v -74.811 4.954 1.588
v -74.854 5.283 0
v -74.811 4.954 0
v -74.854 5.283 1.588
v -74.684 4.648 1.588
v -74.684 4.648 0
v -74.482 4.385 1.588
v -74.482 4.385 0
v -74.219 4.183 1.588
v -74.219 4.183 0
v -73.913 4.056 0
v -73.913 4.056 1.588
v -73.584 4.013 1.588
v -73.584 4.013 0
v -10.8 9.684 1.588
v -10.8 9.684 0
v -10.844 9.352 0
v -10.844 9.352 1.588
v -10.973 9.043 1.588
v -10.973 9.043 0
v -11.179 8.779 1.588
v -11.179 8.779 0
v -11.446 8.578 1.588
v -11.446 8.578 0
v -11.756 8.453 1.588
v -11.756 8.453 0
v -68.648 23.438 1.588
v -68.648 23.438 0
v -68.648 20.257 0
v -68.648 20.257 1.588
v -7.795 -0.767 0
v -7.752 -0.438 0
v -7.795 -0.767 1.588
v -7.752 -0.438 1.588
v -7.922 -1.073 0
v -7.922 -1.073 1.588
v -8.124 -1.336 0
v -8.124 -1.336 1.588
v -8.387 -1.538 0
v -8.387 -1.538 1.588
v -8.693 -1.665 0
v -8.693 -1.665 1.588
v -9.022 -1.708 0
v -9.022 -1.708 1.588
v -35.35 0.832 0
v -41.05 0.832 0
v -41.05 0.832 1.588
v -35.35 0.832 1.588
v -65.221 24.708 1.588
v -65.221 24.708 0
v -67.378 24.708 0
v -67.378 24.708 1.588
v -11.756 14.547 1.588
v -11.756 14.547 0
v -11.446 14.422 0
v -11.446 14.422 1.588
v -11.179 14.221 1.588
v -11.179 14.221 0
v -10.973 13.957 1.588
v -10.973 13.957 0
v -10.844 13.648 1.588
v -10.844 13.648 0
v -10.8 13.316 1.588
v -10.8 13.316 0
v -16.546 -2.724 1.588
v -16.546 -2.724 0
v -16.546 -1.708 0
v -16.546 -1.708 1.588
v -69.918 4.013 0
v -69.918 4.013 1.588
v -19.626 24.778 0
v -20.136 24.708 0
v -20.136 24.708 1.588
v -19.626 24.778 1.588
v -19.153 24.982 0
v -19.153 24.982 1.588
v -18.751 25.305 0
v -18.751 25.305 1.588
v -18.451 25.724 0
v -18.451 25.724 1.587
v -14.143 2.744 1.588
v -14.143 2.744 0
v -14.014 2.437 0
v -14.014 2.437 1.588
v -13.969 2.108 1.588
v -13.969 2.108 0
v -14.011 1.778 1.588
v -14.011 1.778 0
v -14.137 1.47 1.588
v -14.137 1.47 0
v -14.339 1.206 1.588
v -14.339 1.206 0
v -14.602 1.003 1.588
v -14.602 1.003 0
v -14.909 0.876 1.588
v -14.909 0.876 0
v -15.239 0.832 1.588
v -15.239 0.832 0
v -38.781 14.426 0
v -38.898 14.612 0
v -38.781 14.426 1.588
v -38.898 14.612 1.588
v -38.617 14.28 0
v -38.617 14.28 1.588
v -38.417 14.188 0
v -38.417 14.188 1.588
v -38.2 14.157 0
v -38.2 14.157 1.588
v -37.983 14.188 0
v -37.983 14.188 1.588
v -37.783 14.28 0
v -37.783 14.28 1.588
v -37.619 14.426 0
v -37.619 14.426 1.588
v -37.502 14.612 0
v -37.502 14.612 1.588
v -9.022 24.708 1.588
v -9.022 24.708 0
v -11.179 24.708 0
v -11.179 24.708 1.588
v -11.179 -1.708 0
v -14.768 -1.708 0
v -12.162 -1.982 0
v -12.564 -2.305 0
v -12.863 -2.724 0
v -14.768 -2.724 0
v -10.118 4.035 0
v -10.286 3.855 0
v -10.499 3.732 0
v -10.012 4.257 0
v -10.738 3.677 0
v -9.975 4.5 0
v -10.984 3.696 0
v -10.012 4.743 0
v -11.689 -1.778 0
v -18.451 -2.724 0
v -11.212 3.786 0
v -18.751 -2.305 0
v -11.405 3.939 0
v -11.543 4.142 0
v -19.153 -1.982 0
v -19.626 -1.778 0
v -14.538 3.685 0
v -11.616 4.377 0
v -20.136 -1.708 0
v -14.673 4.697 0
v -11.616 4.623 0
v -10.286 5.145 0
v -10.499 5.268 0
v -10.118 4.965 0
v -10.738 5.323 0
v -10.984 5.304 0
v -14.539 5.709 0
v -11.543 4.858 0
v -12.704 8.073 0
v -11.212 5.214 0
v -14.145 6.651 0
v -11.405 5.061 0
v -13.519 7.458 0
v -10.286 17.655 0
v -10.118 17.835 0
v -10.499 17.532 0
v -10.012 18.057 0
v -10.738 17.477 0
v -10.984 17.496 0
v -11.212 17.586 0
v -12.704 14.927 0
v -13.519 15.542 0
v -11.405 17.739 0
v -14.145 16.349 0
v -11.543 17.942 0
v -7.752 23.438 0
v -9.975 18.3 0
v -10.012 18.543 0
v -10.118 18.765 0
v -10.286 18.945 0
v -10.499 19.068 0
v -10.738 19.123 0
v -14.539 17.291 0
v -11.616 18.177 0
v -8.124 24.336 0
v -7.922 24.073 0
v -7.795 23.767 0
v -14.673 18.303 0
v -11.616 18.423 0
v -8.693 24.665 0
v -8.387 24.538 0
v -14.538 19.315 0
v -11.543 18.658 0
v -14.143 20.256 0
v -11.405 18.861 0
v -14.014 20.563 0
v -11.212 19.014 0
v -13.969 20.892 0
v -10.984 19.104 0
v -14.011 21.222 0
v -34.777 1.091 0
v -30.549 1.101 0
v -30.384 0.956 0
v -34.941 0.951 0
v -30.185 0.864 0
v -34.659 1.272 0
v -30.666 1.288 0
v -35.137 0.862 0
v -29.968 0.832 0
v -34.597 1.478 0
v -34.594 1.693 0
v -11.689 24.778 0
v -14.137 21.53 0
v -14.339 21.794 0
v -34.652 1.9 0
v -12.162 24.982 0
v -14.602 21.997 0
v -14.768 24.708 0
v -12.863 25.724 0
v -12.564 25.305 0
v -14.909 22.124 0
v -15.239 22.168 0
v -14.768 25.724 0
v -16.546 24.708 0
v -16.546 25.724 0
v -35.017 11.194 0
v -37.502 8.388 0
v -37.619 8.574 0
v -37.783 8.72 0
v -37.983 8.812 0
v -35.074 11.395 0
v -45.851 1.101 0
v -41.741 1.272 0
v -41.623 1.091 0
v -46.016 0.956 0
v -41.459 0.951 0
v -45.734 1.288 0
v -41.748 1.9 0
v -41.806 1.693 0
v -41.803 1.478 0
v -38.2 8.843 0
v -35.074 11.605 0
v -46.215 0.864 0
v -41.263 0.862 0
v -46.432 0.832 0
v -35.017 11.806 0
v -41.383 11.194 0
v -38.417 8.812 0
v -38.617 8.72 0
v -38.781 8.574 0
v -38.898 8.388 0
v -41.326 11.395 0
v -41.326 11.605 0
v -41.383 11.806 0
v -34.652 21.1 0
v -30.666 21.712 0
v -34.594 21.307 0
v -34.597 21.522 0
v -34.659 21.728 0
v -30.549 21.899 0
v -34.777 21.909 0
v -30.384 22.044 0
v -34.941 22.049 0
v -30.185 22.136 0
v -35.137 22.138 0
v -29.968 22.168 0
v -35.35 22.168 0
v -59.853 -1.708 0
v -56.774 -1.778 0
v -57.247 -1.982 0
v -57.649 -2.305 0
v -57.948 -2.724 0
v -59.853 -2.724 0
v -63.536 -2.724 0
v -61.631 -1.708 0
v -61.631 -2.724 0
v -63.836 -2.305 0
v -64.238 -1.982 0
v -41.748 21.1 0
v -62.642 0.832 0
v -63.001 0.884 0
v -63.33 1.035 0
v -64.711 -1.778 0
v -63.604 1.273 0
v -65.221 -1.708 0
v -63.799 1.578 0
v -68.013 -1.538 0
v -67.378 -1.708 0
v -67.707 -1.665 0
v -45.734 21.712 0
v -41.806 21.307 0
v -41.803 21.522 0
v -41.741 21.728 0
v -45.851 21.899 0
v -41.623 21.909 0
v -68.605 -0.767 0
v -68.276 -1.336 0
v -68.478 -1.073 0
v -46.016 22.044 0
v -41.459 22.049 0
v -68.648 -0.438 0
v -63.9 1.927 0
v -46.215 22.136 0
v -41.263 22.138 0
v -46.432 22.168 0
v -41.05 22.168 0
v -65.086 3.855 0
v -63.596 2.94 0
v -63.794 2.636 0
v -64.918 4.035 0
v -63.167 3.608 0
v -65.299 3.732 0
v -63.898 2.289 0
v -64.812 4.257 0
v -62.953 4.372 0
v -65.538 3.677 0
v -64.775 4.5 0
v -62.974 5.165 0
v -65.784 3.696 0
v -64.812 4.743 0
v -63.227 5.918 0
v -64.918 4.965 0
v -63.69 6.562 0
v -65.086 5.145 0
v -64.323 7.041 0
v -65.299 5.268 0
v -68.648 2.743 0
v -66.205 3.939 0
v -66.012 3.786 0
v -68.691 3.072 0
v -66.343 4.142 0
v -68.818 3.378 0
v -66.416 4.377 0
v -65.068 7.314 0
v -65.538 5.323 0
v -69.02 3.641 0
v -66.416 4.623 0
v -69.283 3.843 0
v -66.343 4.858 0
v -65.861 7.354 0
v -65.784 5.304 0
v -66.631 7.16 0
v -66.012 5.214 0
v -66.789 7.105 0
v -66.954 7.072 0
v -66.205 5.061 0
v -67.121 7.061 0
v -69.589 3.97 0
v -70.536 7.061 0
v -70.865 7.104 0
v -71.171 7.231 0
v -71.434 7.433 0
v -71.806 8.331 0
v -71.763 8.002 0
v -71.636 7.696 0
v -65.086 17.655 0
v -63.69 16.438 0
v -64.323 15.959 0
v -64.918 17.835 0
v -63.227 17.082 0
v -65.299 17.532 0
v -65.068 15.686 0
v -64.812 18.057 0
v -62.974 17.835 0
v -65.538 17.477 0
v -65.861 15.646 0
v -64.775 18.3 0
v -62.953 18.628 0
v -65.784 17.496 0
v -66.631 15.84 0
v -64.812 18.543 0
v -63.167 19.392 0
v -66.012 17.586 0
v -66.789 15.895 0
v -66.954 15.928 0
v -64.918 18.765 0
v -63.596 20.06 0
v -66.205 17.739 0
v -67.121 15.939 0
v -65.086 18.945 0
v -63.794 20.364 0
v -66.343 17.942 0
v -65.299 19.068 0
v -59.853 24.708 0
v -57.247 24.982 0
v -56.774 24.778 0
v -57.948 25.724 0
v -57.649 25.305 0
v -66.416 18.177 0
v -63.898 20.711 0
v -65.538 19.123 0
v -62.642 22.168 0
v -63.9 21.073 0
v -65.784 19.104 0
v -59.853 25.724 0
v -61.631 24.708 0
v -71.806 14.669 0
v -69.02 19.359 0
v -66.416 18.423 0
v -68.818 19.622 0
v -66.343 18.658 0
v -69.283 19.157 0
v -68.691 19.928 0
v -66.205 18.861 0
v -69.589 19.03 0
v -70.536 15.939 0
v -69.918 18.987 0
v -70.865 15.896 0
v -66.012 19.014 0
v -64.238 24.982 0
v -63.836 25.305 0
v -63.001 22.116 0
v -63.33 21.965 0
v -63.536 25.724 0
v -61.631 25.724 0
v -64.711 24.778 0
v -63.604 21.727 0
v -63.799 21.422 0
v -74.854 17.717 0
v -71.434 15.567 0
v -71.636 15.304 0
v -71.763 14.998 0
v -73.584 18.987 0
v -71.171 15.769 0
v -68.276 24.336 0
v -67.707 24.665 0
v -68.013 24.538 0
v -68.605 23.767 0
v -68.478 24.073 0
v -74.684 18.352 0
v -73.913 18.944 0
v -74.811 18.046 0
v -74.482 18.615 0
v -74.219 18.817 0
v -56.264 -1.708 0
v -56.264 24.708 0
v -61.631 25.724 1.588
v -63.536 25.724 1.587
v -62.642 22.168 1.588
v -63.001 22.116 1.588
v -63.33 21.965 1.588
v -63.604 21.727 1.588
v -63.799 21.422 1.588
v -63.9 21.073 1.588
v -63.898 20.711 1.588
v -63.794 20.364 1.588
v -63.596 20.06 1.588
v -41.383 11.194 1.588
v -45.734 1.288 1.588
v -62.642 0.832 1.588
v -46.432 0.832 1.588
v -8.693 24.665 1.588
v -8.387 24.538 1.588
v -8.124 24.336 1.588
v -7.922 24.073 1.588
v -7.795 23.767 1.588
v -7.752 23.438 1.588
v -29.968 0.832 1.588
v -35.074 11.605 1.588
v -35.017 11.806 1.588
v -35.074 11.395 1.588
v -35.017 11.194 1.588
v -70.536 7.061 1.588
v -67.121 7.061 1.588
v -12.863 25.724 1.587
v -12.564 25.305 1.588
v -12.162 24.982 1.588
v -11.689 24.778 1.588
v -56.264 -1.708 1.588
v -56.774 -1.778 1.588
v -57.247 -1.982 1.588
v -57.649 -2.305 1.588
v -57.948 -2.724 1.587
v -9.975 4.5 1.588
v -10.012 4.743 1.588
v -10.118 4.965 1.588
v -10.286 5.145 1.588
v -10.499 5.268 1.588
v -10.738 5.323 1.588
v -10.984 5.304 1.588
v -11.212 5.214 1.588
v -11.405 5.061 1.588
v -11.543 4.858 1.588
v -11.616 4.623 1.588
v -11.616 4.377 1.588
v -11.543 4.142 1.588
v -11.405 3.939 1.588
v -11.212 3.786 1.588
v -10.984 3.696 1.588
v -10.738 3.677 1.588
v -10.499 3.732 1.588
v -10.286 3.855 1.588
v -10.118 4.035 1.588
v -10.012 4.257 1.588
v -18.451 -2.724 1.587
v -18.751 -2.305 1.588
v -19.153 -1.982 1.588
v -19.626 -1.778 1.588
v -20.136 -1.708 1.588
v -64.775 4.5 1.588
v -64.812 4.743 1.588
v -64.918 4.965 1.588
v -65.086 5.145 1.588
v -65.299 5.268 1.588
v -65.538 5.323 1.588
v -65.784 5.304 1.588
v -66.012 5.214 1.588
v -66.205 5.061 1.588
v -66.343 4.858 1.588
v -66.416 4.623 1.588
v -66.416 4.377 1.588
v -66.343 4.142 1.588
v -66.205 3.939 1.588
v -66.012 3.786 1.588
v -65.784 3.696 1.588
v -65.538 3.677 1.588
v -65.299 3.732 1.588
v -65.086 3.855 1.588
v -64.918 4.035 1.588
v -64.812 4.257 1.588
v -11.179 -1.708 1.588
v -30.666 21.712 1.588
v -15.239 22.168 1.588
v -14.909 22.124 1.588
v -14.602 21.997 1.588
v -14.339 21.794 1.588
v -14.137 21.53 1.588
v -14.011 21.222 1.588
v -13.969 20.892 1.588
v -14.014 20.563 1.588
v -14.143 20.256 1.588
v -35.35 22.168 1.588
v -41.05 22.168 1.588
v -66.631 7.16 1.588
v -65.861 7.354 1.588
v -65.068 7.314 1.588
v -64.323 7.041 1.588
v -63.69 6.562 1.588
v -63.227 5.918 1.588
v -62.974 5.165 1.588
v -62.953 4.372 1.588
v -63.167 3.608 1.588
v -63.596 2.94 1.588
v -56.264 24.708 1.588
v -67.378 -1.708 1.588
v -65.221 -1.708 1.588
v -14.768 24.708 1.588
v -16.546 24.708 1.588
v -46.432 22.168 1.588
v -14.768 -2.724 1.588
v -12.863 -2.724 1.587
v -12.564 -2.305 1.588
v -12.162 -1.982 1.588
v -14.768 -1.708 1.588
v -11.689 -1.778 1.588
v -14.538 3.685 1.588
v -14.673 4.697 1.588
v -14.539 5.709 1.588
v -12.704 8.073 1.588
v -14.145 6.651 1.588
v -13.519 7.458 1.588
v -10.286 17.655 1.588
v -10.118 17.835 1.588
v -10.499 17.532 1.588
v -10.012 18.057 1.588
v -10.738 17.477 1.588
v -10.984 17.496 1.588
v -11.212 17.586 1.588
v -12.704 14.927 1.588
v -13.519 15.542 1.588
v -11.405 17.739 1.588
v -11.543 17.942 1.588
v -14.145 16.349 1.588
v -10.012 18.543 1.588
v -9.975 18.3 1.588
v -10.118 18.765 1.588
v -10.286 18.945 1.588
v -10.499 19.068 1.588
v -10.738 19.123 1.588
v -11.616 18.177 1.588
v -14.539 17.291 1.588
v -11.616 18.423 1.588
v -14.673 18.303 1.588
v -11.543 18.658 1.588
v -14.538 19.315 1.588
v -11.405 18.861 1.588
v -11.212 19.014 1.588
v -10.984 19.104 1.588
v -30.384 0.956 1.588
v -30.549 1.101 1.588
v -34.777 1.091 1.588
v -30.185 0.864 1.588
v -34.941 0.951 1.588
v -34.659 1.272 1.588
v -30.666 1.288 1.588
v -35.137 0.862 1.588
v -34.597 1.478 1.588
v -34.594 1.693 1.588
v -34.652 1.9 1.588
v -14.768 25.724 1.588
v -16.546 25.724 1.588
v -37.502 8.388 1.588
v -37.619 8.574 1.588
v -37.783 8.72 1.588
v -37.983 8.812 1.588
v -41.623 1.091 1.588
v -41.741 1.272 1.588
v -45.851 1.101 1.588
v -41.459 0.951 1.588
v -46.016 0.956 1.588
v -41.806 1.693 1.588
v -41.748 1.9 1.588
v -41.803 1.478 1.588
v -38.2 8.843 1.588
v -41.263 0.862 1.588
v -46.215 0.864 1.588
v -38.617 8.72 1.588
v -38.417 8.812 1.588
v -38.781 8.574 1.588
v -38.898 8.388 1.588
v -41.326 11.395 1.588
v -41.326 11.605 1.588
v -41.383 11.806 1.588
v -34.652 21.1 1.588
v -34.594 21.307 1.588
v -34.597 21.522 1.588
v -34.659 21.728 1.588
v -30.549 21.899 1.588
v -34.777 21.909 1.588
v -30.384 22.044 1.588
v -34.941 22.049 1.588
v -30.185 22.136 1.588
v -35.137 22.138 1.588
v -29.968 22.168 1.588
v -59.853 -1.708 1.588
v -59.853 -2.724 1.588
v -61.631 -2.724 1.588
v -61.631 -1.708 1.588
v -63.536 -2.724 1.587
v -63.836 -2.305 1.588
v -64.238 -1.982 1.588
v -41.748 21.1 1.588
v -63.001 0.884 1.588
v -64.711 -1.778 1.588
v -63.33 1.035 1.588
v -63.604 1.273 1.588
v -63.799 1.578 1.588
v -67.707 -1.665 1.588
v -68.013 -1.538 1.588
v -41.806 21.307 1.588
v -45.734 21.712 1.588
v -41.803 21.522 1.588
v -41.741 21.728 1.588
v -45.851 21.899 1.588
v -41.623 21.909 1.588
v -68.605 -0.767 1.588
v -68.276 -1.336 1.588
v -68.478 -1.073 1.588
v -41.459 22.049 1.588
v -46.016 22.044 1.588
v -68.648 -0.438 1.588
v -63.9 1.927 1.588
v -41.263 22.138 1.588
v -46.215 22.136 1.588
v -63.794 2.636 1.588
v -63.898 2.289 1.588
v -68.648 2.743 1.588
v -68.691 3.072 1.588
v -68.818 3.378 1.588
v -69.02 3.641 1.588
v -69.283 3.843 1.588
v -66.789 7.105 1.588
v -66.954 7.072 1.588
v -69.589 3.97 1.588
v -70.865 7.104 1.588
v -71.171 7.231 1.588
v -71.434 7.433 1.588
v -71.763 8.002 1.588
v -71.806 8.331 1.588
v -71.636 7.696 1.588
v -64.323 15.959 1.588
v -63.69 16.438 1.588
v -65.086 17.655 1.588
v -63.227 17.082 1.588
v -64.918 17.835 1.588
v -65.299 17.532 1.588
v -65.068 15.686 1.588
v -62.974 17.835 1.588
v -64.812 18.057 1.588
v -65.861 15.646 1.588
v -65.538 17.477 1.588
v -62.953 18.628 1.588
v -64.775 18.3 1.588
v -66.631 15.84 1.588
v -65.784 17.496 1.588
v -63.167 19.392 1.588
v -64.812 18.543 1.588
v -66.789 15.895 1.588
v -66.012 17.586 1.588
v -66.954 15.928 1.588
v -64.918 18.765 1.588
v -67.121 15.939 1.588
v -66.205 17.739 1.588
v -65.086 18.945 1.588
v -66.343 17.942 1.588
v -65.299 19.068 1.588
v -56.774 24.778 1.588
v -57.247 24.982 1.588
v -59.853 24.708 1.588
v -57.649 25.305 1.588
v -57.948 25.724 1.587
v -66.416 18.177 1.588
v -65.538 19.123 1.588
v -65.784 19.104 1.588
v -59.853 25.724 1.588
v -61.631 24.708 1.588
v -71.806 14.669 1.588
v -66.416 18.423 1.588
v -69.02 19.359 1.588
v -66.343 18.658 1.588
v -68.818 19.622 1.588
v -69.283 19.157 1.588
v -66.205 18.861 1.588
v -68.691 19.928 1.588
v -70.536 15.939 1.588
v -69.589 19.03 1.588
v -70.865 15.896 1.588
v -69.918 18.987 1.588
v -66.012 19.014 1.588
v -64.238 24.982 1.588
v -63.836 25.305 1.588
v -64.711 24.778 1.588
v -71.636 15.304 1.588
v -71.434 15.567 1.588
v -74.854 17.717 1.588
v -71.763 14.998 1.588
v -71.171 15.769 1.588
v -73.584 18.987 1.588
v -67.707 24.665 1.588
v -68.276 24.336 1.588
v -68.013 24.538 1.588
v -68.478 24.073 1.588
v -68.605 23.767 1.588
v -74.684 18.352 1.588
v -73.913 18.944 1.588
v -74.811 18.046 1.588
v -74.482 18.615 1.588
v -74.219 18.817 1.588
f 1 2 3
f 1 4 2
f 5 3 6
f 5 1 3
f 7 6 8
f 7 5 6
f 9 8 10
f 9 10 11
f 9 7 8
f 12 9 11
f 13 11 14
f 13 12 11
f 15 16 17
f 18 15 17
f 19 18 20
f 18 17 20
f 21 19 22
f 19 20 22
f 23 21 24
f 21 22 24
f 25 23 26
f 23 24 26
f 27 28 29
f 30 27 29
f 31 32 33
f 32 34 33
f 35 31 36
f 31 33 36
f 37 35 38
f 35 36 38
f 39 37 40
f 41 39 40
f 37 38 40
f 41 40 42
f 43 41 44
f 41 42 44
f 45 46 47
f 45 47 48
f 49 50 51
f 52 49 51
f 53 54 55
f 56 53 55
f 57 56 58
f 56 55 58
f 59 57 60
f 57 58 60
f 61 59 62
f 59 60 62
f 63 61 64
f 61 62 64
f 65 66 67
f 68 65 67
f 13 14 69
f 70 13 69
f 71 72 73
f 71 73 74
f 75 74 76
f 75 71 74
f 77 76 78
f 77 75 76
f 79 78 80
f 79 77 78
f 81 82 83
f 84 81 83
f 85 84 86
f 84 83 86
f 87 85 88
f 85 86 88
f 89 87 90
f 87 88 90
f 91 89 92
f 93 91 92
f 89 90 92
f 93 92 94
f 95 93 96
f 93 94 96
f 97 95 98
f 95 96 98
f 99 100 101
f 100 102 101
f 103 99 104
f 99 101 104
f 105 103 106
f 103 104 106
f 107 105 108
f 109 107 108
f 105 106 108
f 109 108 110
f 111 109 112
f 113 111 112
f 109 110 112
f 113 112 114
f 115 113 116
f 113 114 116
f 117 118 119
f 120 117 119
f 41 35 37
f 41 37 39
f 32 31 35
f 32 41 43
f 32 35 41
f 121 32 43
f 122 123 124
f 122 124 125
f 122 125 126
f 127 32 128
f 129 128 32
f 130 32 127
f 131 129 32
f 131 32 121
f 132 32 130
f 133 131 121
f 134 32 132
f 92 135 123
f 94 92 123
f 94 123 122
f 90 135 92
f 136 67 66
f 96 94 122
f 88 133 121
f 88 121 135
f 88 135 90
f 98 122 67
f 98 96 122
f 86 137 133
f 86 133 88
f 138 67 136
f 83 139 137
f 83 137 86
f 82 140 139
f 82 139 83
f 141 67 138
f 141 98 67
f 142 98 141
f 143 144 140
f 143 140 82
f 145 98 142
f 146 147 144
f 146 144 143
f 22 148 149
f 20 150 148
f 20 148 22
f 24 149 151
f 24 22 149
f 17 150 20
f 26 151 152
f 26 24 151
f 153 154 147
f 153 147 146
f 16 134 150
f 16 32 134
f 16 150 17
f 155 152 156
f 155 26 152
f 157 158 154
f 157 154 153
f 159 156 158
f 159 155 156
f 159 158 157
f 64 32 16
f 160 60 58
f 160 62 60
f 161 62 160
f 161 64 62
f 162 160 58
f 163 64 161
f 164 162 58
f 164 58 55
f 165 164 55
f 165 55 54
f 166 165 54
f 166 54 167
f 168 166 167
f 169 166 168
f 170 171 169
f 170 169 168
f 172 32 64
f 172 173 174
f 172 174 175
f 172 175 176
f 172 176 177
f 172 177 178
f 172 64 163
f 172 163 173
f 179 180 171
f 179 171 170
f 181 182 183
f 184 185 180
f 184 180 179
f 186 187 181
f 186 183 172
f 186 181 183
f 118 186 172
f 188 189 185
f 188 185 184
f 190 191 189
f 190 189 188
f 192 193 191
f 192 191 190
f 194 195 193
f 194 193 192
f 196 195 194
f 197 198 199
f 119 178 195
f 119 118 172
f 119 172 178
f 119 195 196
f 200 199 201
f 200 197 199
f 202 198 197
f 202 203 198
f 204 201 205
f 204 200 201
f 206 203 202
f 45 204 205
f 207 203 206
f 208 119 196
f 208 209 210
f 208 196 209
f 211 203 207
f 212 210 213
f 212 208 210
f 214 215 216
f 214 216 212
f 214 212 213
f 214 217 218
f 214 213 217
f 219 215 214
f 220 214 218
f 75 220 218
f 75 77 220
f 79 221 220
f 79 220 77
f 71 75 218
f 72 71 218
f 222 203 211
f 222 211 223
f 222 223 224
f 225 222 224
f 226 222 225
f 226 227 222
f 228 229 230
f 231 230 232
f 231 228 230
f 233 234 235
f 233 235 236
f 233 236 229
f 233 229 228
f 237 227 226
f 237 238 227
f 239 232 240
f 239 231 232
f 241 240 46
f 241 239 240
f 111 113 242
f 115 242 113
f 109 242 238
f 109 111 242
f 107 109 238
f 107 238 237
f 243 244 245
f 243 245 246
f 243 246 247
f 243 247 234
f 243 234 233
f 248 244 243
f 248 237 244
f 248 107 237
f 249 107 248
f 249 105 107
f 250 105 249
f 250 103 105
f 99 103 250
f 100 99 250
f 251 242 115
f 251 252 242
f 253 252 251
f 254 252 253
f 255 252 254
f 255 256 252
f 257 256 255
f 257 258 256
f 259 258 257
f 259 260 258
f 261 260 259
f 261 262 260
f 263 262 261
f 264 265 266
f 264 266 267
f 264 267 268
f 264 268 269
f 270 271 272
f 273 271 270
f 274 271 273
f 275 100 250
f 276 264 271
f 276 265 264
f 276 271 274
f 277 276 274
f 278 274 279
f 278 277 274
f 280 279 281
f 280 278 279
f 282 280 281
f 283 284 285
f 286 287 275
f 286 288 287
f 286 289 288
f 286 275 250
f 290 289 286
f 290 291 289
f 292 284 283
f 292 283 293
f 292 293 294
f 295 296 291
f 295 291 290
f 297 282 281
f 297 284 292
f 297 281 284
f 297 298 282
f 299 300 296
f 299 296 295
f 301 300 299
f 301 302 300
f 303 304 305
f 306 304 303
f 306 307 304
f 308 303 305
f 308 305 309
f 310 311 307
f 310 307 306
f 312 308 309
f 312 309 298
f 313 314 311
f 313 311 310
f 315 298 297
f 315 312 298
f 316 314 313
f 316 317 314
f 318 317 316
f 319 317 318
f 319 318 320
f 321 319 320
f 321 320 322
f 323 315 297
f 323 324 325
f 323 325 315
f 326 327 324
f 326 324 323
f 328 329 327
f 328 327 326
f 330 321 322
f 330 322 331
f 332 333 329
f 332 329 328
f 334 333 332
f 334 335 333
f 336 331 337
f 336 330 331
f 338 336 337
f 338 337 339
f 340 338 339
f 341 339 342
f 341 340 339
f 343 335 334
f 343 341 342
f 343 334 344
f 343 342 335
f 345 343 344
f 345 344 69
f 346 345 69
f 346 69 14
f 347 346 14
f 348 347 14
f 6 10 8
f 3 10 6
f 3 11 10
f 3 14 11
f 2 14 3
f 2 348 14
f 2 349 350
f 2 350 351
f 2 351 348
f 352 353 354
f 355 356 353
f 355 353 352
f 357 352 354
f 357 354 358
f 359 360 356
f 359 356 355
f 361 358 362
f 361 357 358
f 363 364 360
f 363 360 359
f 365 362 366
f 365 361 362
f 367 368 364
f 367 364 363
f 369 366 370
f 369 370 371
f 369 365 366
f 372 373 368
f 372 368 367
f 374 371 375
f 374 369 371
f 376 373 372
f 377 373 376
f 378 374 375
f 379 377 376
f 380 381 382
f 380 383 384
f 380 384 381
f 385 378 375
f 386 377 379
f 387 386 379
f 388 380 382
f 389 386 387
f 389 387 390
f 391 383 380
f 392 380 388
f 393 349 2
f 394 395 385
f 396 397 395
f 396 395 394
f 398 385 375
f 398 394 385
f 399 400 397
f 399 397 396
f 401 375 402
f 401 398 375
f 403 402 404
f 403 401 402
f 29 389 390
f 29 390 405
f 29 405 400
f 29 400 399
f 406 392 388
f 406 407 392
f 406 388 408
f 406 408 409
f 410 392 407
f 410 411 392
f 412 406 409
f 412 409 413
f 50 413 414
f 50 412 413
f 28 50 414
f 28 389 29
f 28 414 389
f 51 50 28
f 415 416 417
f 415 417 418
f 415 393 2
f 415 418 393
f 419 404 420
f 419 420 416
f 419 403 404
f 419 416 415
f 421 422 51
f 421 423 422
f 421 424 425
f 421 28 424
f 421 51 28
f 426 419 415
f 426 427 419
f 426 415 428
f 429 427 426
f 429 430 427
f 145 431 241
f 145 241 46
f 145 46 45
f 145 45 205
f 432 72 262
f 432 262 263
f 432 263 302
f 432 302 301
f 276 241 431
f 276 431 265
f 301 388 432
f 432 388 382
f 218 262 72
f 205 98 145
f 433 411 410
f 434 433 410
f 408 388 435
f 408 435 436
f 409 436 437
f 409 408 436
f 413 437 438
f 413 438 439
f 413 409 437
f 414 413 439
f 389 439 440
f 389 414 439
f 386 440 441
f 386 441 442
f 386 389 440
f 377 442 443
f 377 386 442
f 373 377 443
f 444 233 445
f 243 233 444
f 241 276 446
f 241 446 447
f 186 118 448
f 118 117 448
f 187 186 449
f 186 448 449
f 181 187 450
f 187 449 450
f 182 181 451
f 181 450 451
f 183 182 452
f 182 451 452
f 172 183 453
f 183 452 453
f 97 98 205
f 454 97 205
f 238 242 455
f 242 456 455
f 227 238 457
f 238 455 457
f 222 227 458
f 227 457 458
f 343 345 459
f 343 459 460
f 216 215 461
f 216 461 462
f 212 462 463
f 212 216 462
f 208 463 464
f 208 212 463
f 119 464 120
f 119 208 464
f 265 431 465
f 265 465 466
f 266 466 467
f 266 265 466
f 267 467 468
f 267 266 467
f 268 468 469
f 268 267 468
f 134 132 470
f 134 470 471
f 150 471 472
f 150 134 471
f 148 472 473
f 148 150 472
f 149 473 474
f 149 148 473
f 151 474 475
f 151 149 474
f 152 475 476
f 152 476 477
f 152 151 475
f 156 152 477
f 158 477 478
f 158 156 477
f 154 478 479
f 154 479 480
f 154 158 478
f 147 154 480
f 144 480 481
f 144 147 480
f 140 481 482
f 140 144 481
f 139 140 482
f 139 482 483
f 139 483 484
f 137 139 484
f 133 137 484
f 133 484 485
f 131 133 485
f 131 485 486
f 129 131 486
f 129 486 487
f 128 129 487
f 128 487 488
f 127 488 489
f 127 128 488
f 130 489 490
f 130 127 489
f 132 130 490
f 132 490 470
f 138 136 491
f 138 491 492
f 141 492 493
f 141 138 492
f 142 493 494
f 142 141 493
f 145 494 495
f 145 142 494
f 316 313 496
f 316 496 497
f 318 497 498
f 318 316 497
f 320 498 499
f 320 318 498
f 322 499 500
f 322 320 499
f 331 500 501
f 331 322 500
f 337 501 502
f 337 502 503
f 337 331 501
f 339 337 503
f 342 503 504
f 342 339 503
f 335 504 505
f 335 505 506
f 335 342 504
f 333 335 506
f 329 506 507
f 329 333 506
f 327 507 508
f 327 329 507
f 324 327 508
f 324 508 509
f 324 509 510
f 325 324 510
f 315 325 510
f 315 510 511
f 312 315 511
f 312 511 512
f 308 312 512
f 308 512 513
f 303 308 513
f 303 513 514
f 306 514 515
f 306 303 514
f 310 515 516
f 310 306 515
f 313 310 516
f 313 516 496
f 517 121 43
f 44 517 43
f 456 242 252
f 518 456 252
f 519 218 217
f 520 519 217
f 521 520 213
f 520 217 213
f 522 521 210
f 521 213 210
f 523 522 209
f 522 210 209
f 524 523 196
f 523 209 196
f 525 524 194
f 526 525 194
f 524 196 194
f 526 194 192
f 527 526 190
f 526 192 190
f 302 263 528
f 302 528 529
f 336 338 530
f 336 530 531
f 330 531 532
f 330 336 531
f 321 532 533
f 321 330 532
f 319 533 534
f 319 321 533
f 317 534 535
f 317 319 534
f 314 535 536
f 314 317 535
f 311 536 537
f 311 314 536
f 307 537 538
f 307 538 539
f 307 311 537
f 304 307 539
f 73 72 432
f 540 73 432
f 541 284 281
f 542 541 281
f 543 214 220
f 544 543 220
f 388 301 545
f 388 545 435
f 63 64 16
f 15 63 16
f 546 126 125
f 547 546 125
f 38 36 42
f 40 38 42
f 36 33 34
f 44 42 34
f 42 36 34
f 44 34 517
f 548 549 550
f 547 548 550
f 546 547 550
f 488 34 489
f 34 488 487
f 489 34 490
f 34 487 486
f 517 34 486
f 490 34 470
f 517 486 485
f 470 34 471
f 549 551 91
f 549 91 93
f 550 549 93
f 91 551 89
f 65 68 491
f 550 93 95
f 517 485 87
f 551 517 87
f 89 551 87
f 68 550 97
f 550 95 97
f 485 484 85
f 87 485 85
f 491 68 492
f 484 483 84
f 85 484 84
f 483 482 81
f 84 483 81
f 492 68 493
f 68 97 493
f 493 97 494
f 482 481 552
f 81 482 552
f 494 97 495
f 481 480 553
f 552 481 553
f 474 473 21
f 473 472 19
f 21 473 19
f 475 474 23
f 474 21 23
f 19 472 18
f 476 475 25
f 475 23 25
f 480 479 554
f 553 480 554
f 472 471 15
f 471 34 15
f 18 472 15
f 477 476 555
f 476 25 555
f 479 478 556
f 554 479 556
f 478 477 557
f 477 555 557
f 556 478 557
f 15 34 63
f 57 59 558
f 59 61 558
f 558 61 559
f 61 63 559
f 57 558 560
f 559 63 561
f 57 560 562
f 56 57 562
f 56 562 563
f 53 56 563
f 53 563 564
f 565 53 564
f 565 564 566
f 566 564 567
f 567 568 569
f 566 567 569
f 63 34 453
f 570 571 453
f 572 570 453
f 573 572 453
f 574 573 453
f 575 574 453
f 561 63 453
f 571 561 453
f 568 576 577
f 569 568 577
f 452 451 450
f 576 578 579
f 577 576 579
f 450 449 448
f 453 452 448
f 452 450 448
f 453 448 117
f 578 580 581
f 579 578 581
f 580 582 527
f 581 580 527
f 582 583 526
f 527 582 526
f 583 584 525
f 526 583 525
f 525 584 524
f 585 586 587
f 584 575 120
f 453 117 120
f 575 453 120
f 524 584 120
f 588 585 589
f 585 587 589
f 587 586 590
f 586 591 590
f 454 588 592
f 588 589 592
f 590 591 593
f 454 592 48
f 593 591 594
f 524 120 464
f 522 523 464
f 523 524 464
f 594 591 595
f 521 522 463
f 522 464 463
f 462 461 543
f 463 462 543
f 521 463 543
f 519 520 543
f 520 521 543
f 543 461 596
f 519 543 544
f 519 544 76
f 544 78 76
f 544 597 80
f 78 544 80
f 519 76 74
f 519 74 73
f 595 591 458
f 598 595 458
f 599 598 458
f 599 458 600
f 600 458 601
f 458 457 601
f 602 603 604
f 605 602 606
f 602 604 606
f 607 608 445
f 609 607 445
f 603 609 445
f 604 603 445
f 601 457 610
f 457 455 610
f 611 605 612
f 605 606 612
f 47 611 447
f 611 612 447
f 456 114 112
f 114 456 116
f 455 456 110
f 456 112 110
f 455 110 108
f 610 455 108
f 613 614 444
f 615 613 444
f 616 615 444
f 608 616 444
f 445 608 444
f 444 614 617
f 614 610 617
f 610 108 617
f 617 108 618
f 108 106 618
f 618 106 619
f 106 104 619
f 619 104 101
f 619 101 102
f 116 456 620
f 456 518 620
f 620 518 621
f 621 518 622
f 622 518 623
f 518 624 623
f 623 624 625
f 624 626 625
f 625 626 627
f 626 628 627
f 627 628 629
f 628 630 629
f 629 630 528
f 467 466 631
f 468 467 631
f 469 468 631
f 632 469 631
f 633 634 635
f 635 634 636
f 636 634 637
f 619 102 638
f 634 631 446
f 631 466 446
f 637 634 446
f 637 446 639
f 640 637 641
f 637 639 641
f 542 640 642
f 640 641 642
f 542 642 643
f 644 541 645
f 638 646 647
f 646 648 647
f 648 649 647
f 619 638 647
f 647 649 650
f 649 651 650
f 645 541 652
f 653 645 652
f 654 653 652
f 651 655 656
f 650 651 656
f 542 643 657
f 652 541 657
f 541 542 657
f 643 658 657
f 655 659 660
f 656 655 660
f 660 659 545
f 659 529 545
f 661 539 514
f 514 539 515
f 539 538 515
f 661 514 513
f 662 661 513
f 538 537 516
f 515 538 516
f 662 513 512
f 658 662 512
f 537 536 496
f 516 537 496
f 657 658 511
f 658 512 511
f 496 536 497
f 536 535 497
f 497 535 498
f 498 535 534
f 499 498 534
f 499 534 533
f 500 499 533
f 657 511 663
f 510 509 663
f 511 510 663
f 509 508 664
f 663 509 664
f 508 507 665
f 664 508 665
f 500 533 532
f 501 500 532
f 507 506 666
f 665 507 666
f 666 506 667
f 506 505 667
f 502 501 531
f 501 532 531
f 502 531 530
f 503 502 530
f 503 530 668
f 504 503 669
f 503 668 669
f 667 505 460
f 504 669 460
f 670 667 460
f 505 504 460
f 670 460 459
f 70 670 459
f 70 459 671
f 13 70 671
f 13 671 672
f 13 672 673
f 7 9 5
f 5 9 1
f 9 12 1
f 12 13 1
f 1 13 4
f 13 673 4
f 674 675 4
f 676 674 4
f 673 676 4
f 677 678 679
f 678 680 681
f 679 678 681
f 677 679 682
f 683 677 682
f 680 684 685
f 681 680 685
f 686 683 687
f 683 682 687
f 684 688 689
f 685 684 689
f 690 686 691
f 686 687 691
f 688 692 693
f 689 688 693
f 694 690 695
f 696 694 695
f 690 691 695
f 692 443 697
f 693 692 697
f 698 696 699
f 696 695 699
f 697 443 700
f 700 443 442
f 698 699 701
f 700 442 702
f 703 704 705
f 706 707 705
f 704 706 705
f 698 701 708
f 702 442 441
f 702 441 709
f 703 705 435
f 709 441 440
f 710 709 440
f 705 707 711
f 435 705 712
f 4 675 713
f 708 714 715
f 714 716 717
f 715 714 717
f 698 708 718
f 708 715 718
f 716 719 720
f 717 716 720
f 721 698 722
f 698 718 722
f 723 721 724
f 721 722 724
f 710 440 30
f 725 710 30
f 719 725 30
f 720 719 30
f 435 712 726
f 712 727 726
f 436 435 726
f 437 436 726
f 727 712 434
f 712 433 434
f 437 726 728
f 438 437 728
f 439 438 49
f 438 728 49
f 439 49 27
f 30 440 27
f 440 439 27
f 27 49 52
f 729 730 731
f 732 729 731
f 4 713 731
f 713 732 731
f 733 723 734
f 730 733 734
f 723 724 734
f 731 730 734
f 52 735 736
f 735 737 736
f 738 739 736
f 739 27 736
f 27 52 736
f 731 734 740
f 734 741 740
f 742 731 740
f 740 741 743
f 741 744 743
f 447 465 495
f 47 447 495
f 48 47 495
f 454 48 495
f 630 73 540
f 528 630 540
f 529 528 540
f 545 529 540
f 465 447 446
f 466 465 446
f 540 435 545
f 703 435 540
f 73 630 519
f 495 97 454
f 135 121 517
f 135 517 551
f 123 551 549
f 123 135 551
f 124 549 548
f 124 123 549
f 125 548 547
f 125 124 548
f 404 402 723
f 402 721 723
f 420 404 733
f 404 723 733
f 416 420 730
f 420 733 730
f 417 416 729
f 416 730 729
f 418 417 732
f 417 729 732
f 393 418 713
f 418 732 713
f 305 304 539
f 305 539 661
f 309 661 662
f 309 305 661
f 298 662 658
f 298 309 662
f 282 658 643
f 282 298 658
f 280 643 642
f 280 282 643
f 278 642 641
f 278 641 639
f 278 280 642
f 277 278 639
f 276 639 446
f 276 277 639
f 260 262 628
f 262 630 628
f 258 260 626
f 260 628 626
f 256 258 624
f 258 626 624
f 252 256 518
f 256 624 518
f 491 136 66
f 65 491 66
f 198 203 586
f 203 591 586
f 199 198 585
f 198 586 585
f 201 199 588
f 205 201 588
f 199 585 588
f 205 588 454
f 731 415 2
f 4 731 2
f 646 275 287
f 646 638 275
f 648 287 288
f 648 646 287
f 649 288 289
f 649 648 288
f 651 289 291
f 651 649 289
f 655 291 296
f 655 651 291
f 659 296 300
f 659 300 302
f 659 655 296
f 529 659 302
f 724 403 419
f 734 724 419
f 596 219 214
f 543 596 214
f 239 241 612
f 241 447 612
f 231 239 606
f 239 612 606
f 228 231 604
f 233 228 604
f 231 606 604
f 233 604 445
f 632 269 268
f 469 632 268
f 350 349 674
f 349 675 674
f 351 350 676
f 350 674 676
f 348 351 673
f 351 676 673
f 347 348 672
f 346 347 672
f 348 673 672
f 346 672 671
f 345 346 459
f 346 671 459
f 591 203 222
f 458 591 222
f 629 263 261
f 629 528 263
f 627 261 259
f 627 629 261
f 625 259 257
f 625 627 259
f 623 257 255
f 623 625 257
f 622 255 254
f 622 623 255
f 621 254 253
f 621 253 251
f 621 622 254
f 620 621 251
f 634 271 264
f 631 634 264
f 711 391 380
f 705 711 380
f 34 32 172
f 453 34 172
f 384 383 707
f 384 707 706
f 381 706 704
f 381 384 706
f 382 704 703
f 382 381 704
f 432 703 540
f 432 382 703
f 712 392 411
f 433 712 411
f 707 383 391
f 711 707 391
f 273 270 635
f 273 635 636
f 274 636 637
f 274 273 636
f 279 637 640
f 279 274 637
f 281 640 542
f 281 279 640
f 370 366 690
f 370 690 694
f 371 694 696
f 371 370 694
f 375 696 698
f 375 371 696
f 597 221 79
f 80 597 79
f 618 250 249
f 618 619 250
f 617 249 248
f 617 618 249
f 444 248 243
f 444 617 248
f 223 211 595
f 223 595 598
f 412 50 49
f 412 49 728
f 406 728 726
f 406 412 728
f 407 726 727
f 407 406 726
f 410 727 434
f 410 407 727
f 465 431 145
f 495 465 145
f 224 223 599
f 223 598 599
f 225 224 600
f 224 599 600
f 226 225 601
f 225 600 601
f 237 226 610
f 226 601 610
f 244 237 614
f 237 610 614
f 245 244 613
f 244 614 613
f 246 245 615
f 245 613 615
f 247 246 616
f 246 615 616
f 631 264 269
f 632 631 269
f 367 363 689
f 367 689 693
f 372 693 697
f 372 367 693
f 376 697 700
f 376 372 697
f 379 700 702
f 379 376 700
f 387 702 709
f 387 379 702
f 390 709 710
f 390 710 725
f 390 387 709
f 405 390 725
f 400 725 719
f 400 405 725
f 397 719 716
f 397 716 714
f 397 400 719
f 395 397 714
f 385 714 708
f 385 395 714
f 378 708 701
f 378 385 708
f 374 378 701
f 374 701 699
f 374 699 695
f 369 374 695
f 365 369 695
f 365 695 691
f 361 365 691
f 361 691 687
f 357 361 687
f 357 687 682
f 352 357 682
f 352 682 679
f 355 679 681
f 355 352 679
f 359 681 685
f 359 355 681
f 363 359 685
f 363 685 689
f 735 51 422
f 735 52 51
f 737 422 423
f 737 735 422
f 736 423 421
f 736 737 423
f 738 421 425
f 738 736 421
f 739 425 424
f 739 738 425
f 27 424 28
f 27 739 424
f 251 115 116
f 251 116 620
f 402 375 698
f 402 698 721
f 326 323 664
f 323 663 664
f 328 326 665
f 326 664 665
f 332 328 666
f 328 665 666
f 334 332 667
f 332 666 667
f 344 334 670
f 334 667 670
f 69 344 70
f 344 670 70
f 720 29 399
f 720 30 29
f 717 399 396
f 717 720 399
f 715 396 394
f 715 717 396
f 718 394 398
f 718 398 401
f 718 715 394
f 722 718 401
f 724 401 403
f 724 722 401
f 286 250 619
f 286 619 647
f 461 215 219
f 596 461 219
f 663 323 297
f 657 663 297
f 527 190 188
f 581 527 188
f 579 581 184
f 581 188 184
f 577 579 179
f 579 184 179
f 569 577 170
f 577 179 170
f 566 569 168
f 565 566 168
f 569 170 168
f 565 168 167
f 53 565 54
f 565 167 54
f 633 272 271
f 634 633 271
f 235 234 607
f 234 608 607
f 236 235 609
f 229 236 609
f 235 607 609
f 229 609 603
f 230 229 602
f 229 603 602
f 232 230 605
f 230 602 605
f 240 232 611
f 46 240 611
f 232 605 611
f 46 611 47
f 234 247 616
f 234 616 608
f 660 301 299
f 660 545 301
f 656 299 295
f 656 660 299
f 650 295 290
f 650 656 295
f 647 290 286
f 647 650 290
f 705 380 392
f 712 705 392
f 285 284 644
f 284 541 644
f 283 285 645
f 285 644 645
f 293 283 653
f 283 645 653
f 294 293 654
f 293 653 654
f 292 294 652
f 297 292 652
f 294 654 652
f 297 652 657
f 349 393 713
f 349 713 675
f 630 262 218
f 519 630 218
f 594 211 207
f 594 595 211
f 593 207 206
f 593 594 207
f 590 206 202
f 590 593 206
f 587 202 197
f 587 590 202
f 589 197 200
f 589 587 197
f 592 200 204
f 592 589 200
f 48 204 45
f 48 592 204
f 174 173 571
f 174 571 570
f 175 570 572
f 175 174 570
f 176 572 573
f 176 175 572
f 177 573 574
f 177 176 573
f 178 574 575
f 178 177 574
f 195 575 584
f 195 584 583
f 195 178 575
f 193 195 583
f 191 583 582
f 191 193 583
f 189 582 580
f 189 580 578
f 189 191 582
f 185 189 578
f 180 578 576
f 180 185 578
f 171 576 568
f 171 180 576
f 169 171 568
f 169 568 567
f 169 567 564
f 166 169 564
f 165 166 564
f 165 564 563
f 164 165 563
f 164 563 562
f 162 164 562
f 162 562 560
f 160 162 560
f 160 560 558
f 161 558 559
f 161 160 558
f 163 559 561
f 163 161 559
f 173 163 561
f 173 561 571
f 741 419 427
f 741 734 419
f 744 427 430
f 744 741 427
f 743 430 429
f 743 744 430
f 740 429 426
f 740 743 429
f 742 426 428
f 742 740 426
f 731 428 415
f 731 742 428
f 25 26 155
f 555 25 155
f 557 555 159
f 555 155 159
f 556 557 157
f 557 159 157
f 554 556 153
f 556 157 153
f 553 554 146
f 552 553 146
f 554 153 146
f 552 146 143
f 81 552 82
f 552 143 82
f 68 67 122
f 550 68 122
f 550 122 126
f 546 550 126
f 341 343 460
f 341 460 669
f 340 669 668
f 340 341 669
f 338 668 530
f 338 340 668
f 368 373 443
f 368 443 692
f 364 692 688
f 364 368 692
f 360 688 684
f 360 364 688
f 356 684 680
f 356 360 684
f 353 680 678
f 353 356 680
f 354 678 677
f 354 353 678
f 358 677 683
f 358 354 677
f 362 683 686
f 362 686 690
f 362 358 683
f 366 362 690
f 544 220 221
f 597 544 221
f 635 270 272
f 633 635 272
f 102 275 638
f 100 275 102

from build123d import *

# Parameters (mm, degrees)
SKETCH1_R           = 0.824992
BOSS_EXTRUDE1_DEPTH = 1.5875
FILLET4_R           = 0.762
FILLET5_R           = 1.27
FILLET6_R           = 1.905


with BuildPart() as part:
    # Sketch1 → Boss-Extrude1 (new body)
    with BuildSketch(Plane.XY):
        Polygon((-7.7520038, 24.7080024), (-12.8634998, 24.7080024), (-12.8634998, 25.7240024), (-14.7684998, 25.7240024), (-14.7684998, 24.7080024), (-16.5464998, 24.7080024), (-16.5464998, 25.7240024), (-18.4514998, 25.7240024), (-18.4514998, 24.7080024), (-38.1999998, 24.7080024), (-57.9484998, 24.7080024), (-57.9484998, 25.7240024), (-59.8534998, 25.7240024), (-59.8534998, 24.7080024), (-61.6314998, 24.7080024), (-61.6314998, 25.7240024), (-63.5364998, 25.7240024), (-63.5364998, 24.7080024), (-68.6479958, 24.7080024), (-68.6479958, 18.9868048), (-74.8538, 18.9868048), (-74.8538, 11.5000024), (-74.8538, 4.0132), (-68.6479958, 4.0132), (-68.6479958, -1.7079976), (-63.5364998, -1.7079976), (-63.5364998, -2.7239976), (-61.6314998, -2.7239976), (-61.6314998, -1.7079976), (-59.8534998, -1.7079976), (-59.8534998, -2.7239976), (-57.9484998, -2.7239976), (-57.9484998, -1.7079976), (-38.1999998, -1.7079976), (-18.4514998, -1.7079976), (-18.4514998, -2.7239976), (-16.5464998, -2.7239976), (-16.5464998, -1.7079976), (-14.7684998, -1.7079976), (-14.7684998, -2.7239976), (-12.8634998, -2.7239976), (-12.8634998, -1.7079976), (-7.7520038, -1.7079976), (-7.7520038, 11.5000024), align=None)
        with Locations((-10.8000038, 18.2999888)):
            Circle(SKETCH1_R, mode=Mode.SUBTRACT)
        with Locations((-10.8000038, 4.499991)):
            Circle(SKETCH1_R, mode=Mode.SUBTRACT)
        with Locations((-65.5999958, 18.2999888)):
            Circle(SKETCH1_R, mode=Mode.SUBTRACT)
        with Locations((-65.5999958, 4.499991)):
            Circle(SKETCH1_R, mode=Mode.SUBTRACT)
        with BuildLine():
            Line((-68.6479958, 15.9388048), (-71.8058, 15.9388048))
            Line((-71.8058, 15.9388048), (-71.8058, 11.5000024))
            Line((-71.8058, 11.5000024), (-71.8058, 7.0612))
            Line((-71.8058, 7.0612), (-68.6479958, 7.0612))
            Line((-68.6479958, 7.0612), (-67.121334605, 7.0612))
            ThreePointArc((-67.121334605, 7.0612), (-66.871048858, 7.086106813), (-66.630580151, 7.159850323))
            ThreePointArc((-66.630580151, 7.159850323), (-63.434712075, 6.257075855), (-63.596128623, 2.940071303))
            ThreePointArc((-63.596128623, 2.940071303), (-63.798895247, 1.578288502), (-62.641906157, 0.8320024))
            Line((-62.641906157, 0.8320024), (-45.934562137, 0.8320024))
            Line((-45.934562137, 0.8320024), (-41.2479998, 11.5000024))
            Line((-41.2479998, 11.5000024), (-45.934562137, 22.1680024))
            Line((-45.934562137, 22.1680024), (-62.641906157, 22.1680024))
            ThreePointArc((-62.641906157, 22.1680024), (-63.798895247, 21.421716298), (-63.596128623, 20.059933497))
            ThreePointArc((-63.596128623, 20.059933497), (-63.434712075, 16.742928945), (-66.630580151, 15.840154477))
            ThreePointArc((-66.630580151, 15.840154477), (-66.871048858, 15.913897987), (-67.121334605, 15.9388048))
            Line((-67.121334605, 15.9388048), (-68.6479958, 15.9388048))
        make_face(mode=Mode.SUBTRACT)
        with BuildLine():
            Line((-10.8000038, 13.316268632), (-10.8000038, 9.683736168))
            ThreePointArc((-10.8000038, 9.683736168), (-11.067211137, 8.904437204), (-11.756392579, 8.453066431))
            ThreePointArc((-11.756392579, 8.453066431), (-14.373483224, 6.193438859), (-14.142504388, 2.743550602))
            ThreePointArc((-14.142504388, 2.743550602), (-14.136809019, 1.470284986), (-15.238549964, 0.8320024))
            Line((-15.238549964, 0.8320024), (-30.465437463, 0.8320024))
            Line((-30.465437463, 0.8320024), (-35.1519998, 11.5000024))
            Line((-35.1519998, 11.5000024), (-30.465437463, 22.1680024))
            Line((-30.465437463, 22.1680024), (-15.238549964, 22.1680024))
            ThreePointArc((-15.238549964, 22.1680024), (-14.136809019, 21.529719814), (-14.142504388, 20.256454198))
            ThreePointArc((-14.142504388, 20.256454198), (-14.373483224, 16.806565941), (-11.756392579, 14.546938369))
            ThreePointArc((-11.756392579, 14.546938369), (-11.067211137, 14.095567596), (-10.8000038, 13.316268632))
        make_face(mode=Mode.SUBTRACT)
        Polygon((-42.217053232, 22.1680024), (-38.1999998, 13.0240024), (-34.182946368, 22.1680024), align=None, mode=Mode.SUBTRACT)
        Polygon((-34.182946368, 0.8320024), (-38.1999998, 9.9760024), (-42.217053232, 0.8320024), align=None, mode=Mode.SUBTRACT)
    extrude(amount=BOSS_EXTRUDE1_DEPTH)

    # Fillet4
    fillet4_edges = [part.edges().sort_by_distance(p)[0] for p in [
        (-34.182946368, 22.1680024, 0.79375),
        (-42.217053232, 22.1680024, 0.79375),
        (-38.1999998, 13.0240024, 0.79375),
        (-45.934562137, 0.8320024, 0.79375),
        (-41.2479998, 11.5000024, 0.79375),
        (-45.934562137, 22.1680024, 0.79375),
        (-30.465437463, 22.1680024, 0.79375),
        (-35.1519998, 11.5000024, 0.79375),
        (-30.465437463, 0.8320024, 0.79375),
        (-42.217053232, 0.8320024, 0.79375),
        (-34.182946368, 0.8320024, 0.79375),
        (-38.1999998, 9.9760024, 0.79375),
    ]]
    fillet(fillet4_edges, radius=FILLET4_R)

    # Fillet5
    fillet5_edges = [part.edges().sort_by_distance(p)[0] for p in [
        (-71.8058, 15.9388048, 0.79375),
        (-71.8058, 7.0612, 0.79375),
        (-7.7520038, -1.7079976, 0.79375),
        (-68.6479958, -1.7079976, 0.79375),
        (-68.6479958, 4.0132, 0.79375),
        (-74.8538, 4.0132, 0.79375),
        (-74.8538, 18.9868048, 0.79375),
        (-68.6479958, 18.9868048, 0.79375),
        (-68.6479958, 24.7080024, 0.79375),
        (-7.7520038, 24.7080024, 0.79375),
    ]]
    fillet(fillet5_edges, radius=FILLET5_R)

    # Fillet6
    # the kernel refuses this fillet: 1.905 mm, written as the material it adds along each edge
    with BuildSketch(Plane(origin=(-18.4514998, -1.7079976, 0), x_dir=(0, -1, 0), z_dir=(0, 0, 1)), Plane(origin=(-63.5364998, -1.7079976, 0), x_dir=(0, -1, 0), z_dir=(0, 0, 1))) as fillet6_piece_1:
        with BuildLine():
            CenterArc((1.905, -1.684845394), FILLET6_R, 117.818139285, 62.181860715)
            Line((0, -1.684845394), (-0.0381, -1.684845394))
            Line((-0.0381, -1.684845394), (-0.0381, 0))
            Line((-0.0381, 0), (0, 0.0381))
            ThreePointArc((0, 0.0381), (0.508, 0.0381), (0.99822, 0.033696908))
            Line((0.99822, 0.033696908), (1.016, 0))
        make_face()
    extrude(amount=1.5875)
    with BuildSketch(Plane(origin=(-12.8634998, -1.7079976, 0), x_dir=(1, 0, 0), z_dir=(0, 0, 1)), Plane(origin=(-57.9484998, -1.7079976, 0), x_dir=(1, 0, 0), z_dir=(0, 0, 1))) as fillet6_piece_2:
        with BuildLine():
            CenterArc((1.684845394, -1.905), FILLET6_R, 90, 62.181860715)
            Line((0, -1.016), (-0.033696908, -0.99822))
            ThreePointArc((-0.033696908, -0.99822), (-0.0381, -0.508), (-0.0381, 0))
            Line((-0.0381, 0), (0, 0.0381))
            Line((0, 0.0381), (1.684845394, 0.0381))
            Line((1.684845394, 0.0381), (1.684845394, 0))
        make_face()
    extrude(amount=1.5875)
    with BuildSketch(Plane(origin=(-18.4514998, 24.7080024, 0), x_dir=(0, 1, 0), z_dir=(0, 0, 1)), Plane(origin=(-63.5364998, 24.7080024, 0), x_dir=(0, 1, 0), z_dir=(0, 0, 1))) as fillet6_piece_3:
        with BuildLine():
            CenterArc((1.905, 1.684845394), FILLET6_R, 180, 62.181860715)
            Line((0, 1.684845394), (-0.0381, 1.684845394))
            Line((-0.0381, 1.684845394), (-0.0381, 0))
            Line((-0.0381, 0), (0, -0.0381))
            ThreePointArc((0, -0.0381), (0.508, -0.0381), (0.99822, -0.033696908))
            Line((0.99822, -0.033696908), (1.016, 0))
        make_face()
    extrude(amount=1.5875)
    with BuildSketch(Plane(origin=(-12.8634998, 24.7080024, 0), x_dir=(1, 0, 0), z_dir=(0, 0, 1)), Plane(origin=(-57.9484998, 24.7080024, 0), x_dir=(1, 0, 0), z_dir=(0, 0, 1))) as fillet6_piece_4:
        with BuildLine():
            CenterArc((1.684845394, 1.905), FILLET6_R, 207.818139285, 62.181860715)
            Line((0, 1.016), (-0.033696908, 0.99822))
            ThreePointArc((-0.033696908, 0.99822), (-0.0381, 0.508), (-0.0381, 0))
            Line((-0.0381, 0), (0, -0.0381))
            Line((0, -0.0381), (1.684845394, -0.0381))
            Line((1.684845394, -0.0381), (1.684845394, 0))
        make_face()
    extrude(amount=1.5875)


solid = part.part
